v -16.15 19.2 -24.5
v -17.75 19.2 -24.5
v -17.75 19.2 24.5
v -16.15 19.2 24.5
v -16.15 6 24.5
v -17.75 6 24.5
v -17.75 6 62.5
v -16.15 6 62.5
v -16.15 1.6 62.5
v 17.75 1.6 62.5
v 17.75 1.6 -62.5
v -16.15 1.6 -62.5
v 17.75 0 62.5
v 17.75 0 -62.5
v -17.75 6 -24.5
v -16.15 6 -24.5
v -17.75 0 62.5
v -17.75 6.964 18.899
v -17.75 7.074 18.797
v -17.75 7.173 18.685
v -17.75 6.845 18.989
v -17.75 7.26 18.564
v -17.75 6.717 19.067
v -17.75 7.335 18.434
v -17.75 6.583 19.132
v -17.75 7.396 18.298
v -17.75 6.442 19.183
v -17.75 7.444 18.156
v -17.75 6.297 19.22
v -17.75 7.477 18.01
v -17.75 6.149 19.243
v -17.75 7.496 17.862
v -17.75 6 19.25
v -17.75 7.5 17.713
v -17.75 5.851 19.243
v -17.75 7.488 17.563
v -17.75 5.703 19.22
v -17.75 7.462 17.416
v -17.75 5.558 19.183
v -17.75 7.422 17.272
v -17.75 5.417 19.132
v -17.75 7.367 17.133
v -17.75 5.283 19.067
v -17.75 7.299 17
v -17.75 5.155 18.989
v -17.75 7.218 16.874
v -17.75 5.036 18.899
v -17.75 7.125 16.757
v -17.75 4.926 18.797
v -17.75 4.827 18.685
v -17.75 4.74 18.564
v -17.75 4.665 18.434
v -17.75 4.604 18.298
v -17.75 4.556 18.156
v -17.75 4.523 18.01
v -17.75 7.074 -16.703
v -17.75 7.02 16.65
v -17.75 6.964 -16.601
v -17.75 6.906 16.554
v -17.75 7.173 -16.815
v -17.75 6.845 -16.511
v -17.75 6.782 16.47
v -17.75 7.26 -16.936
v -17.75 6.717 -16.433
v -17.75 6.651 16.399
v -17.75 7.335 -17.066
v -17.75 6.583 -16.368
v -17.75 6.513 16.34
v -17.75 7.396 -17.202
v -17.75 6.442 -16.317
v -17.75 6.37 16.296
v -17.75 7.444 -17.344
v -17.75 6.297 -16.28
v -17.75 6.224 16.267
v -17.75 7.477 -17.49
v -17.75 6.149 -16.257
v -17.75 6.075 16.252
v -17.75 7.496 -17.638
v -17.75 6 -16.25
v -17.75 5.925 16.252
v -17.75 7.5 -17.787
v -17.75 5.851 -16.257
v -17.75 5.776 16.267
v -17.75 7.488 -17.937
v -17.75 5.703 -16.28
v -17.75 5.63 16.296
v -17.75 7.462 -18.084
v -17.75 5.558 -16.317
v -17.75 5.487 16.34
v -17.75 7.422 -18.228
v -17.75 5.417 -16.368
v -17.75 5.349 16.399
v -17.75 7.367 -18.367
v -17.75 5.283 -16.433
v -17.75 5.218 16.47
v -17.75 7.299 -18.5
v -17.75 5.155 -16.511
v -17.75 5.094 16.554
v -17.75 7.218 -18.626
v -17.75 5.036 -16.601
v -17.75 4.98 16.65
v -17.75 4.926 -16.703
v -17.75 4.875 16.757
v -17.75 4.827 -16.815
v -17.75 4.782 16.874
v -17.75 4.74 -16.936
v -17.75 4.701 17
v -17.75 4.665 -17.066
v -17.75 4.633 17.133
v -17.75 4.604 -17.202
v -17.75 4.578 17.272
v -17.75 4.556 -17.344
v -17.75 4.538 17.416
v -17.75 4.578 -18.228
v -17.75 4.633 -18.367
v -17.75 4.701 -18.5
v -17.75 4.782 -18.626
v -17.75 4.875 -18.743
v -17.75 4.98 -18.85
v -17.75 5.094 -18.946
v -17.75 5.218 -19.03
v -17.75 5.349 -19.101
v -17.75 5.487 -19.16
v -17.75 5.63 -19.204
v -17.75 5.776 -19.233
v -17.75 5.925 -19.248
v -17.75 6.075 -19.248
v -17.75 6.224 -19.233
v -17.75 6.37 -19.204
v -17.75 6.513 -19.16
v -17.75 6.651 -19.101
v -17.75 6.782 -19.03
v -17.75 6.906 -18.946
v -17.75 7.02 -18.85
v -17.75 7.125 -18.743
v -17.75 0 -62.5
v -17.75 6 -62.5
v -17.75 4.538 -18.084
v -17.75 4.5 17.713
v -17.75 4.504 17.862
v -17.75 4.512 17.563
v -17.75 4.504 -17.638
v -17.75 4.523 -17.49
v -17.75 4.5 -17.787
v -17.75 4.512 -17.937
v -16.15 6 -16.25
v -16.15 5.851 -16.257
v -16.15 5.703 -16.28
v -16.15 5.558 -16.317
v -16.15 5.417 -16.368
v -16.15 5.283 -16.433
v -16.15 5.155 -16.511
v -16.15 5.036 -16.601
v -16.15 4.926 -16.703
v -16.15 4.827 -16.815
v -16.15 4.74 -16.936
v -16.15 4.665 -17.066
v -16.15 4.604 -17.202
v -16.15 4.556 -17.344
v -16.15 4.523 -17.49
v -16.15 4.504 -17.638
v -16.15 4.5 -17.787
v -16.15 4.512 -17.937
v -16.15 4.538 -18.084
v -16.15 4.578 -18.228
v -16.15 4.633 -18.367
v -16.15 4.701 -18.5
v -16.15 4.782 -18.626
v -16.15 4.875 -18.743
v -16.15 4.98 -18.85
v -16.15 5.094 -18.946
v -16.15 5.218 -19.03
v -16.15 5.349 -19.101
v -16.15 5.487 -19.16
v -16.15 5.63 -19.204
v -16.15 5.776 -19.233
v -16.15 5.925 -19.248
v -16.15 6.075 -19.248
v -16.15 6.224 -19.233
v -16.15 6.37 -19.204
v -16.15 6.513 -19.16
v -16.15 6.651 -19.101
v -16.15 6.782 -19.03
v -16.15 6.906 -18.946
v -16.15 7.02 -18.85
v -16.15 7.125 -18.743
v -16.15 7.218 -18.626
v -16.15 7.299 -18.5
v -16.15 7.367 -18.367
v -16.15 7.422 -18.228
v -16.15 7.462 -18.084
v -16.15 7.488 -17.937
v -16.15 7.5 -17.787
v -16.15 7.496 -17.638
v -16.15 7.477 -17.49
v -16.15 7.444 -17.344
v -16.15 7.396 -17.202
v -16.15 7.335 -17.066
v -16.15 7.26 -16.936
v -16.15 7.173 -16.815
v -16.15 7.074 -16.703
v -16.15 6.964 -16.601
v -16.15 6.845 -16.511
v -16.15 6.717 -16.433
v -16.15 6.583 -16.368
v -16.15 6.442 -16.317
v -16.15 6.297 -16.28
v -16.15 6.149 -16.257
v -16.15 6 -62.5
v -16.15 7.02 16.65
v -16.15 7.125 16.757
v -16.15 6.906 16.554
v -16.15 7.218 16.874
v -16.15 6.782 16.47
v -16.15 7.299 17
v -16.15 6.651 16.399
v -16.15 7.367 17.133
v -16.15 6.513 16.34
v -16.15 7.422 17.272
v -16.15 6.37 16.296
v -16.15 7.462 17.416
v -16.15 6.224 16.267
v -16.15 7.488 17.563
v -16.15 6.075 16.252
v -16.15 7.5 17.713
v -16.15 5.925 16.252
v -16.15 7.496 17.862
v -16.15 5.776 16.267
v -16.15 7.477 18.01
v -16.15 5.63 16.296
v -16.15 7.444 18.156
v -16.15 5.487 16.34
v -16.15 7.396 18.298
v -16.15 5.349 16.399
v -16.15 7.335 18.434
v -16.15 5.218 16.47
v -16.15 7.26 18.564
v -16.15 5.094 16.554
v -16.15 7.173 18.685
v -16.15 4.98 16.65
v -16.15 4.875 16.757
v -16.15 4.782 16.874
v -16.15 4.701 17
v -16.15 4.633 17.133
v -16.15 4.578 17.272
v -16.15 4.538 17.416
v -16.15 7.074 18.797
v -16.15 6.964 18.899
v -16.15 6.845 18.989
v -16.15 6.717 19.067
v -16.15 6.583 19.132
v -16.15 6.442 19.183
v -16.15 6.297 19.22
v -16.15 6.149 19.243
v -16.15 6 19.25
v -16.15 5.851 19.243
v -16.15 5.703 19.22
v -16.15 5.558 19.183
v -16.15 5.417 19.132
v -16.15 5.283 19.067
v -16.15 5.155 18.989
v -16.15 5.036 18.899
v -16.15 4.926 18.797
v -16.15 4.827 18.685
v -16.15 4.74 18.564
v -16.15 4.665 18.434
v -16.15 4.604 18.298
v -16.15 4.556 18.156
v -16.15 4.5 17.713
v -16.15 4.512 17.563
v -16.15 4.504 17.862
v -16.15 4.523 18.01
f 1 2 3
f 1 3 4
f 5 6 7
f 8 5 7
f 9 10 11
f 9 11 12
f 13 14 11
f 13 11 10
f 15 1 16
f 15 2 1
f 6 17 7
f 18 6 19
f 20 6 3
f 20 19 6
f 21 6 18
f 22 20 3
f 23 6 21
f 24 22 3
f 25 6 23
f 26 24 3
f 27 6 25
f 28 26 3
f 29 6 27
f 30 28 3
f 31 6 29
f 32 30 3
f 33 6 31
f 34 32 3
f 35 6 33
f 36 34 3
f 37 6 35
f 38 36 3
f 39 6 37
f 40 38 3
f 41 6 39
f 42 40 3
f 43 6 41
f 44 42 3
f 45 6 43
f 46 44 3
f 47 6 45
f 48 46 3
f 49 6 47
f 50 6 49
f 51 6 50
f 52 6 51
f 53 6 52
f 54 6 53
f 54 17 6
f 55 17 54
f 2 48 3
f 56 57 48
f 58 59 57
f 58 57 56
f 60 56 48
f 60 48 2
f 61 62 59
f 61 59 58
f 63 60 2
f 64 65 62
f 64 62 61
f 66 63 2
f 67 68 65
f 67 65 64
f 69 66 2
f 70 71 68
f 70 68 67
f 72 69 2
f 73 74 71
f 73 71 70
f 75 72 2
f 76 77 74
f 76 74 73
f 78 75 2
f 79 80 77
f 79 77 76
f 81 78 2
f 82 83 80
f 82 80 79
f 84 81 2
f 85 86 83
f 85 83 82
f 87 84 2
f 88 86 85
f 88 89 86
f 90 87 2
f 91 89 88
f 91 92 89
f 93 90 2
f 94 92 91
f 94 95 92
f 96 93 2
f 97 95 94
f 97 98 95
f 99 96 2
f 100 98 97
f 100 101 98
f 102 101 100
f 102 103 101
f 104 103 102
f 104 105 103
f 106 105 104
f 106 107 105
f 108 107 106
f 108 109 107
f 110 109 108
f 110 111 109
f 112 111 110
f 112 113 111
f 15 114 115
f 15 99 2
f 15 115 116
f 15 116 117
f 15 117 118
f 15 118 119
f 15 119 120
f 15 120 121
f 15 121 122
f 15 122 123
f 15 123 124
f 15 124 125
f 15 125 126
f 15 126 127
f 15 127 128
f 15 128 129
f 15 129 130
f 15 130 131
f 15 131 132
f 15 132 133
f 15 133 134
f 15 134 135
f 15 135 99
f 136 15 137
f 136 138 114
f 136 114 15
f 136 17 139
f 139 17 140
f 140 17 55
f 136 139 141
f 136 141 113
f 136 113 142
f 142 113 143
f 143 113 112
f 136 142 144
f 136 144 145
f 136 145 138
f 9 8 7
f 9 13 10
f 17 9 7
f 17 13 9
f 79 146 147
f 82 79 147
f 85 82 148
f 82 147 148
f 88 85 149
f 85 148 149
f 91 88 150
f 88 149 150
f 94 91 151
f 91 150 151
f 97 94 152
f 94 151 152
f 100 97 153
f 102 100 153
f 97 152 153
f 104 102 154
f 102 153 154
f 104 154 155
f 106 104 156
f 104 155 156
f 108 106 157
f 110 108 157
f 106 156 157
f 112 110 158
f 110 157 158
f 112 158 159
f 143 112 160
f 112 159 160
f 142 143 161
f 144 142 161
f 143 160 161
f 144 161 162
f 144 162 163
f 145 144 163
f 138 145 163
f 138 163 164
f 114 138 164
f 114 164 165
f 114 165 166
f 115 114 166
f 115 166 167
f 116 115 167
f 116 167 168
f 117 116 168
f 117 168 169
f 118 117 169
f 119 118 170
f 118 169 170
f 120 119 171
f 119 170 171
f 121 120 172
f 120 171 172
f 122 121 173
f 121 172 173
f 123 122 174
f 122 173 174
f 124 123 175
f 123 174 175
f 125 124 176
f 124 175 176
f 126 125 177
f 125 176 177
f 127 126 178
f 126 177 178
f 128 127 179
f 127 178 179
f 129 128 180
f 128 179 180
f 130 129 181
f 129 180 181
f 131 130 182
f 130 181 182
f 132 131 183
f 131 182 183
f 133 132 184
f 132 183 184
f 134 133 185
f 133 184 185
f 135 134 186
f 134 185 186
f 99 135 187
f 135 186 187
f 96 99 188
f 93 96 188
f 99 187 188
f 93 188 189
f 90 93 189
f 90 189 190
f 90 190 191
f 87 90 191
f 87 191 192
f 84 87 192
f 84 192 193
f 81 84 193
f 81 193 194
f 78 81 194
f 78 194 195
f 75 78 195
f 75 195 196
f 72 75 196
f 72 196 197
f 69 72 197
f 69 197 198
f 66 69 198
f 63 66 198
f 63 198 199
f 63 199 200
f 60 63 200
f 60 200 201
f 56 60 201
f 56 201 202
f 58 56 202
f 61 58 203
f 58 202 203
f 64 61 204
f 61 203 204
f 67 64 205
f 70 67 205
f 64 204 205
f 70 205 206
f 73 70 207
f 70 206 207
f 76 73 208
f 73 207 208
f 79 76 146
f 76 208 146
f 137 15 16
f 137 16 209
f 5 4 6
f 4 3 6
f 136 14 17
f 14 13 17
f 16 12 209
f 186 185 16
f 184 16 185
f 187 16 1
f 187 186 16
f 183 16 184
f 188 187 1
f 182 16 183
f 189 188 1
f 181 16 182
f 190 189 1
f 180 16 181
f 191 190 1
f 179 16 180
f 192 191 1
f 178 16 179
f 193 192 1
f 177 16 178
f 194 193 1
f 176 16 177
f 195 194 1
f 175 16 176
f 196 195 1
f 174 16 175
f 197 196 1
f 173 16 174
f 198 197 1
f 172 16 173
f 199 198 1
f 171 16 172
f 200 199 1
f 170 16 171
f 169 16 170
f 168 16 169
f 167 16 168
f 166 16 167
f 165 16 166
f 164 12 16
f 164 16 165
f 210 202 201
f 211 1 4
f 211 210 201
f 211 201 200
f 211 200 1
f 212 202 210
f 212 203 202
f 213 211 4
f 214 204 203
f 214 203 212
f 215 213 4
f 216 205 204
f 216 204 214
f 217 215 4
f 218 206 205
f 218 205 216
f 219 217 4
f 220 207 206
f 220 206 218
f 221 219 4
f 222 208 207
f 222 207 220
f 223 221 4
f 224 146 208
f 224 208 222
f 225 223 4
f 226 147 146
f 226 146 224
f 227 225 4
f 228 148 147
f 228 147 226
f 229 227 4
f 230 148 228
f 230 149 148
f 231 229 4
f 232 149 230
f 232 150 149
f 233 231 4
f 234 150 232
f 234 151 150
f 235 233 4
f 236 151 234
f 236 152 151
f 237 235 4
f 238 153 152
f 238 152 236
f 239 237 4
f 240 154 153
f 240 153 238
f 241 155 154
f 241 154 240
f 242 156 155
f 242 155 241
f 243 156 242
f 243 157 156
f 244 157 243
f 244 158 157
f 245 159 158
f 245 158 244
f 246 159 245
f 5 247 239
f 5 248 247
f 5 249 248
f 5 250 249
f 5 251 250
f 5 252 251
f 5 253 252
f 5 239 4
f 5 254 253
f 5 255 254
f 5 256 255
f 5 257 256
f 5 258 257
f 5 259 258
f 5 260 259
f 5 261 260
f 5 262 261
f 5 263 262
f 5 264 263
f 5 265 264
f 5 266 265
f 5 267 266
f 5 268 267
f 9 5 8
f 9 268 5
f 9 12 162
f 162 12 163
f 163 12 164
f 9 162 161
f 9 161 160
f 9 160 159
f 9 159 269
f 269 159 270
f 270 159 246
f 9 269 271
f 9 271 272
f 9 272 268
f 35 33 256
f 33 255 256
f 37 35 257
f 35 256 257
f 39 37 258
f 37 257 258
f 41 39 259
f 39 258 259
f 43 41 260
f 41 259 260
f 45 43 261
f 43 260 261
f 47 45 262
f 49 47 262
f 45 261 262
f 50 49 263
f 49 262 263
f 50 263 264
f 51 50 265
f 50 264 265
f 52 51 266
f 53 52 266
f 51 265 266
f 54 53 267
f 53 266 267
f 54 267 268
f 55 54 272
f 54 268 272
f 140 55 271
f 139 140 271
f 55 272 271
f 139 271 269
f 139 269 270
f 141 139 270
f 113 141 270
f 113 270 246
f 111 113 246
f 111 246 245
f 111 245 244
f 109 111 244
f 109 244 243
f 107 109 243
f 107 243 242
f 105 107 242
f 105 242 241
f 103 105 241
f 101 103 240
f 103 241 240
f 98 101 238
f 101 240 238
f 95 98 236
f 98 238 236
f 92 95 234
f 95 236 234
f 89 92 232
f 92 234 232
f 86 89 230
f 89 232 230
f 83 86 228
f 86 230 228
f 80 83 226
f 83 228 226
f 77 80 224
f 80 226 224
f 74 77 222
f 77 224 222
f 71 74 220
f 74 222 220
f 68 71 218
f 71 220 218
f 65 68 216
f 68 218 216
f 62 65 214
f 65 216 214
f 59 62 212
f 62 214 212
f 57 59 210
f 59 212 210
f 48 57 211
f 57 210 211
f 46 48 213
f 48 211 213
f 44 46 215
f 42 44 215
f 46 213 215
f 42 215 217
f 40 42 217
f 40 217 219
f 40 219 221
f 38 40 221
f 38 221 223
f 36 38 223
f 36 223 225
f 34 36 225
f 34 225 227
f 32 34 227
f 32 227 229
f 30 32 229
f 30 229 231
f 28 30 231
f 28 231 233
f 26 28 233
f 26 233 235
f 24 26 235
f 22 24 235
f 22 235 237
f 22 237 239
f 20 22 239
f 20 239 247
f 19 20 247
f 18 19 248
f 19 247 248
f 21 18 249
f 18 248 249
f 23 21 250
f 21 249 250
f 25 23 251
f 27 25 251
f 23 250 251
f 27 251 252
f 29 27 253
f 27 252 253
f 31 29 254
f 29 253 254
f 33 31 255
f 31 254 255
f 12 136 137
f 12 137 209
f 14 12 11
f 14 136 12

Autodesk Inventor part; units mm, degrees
ref_plane "YZ Plane" through (0, 0, 0) normal (1, 0, 0) x (0, 1, 0)
ref_plane "XZ Plane" through (0, 0, 0) normal (0, 1, 0) x (-1, 0, 0)
ref_plane "XY Plane" through (0, 0, 0) normal (0, 0, 1) x (1, 0, 0)
sketch "Sketch1" plane through (0, 0, 0) normal (0, 1, 0) x (-1, 0, 0)
  line L0 (-17.75, 62.5) -> (17.75, 62.5)
  line L1 (17.75, 62.5) -> (17.75, -62.5)
  line L2 (17.75, -62.5) -> (-17.75, -62.5)
  line L3 (-17.75, -62.5) -> (-17.75, 62.5)
  line L4 (-17.75, 62.5) -> (17.75, -62.5) construction
  line L5 (17.75, 62.5) -> (-17.75, -62.5) construction
  point P0 (0, 0)
  dimension "d0" = 35.5
  dimension "d1" = 125
extrude "Extrusion1" add sketch "Sketch1" along normal blind 1.6
sketch "Sketch2" plane through (0, 1.6, 0) normal (0, 1, 0) x (1, 0, 0)
  line L0 (17.75, 62.5) -> (-17.75, 62.5) projected
  line L1 (-17.75, -62.5) -> (17.75, -62.5) projected
  line L2 (-17.75, 62.5) -> (-16.15, 62.5)
  line L3 (-16.15, 62.5) -> (-16.15, -62.5)
  line L4 (-16.15, -62.5) -> (-17.75, -62.5)
  line L5 (-17.75, -62.5) -> (-17.75, 62.5)
  point P0 (0, 0)
  dimension "d4" = 1.6
extrude "Extrusion2" add sketch "Sketch2" along normal blind 17.6
sketch "Sketch3" plane through (-17.75, 0, -62.5) normal (-1, 0, 0) x (0, 0, 1)
  line L0 (62.5, 0) -> (62.5, 72.1121) construction
  line L1 (98.5, 0) -> (26.5, 0) construction
  line L2 (26.5, 0) -> (26.5, 19.2) construction
  line L3 (26.5, 19.2) -> (98.5, 19.2) construction
  line L4 (98.5, 19.2) -> (98.5, 0) construction
  line L5 (98.5, 0) -> (26.5, 19.2) construction
  line L6 (26.5, 0) -> (98.5, 19.2) construction
  line L7 (0, 19.2) -> (125, 19.2) construction
  line L8 (125, 0) -> (0, 0) construction
  line L9 (125, 19.2) -> (87, 19.2)
  line L10 (87, 19.2) -> (87, 6)
  line L11 (87, 6) -> (125, 6)
  line L12 (125, 6) -> (125, 19.2)
  line L13 (0, 19.2) -> (38, 19.2)
  line L14 (38, 19.2) -> (38, 6)
  line L15 (38, 6) -> (0, 6)
  line L16 (0, 6) -> (0, 19.2)
  point P0 (62.5, 9.6)
  dimension "d7" = 72
  dimension "d8" = 38
  dimension "d9" = 6
extrude "Extrusion3" cut sketch "Sketch3" against normal through all
sketch "Sketch4" plane through (-17.75, 0, -62.5) normal (-1, 0, 0) x (0, 0, 1)
  line L0 (62.5, 0) -> (62.5, 59.5527) construction
  line L1 (44.75, 6) -> (80.25, 6) construction
  line L2 (80.25, 6) -> (80.25, 0) construction
  line L3 (80.25, 0) -> (44.75, 0) construction
  line L4 (44.75, 0) -> (44.75, 6) construction
  line L5 (44.75, 6) -> (80.25, 0) construction
  line L6 (80.25, 6) -> (44.75, 0) construction
  line L7 (125, 0) -> (0, 0) construction
  point P0 (62.5, 3)
  dimension "d12" = 6
  dimension "d13" = 35.5
hole "Hole1" at (-17.75, 6, 17.75) at (-17.75, 6, -17.75) direction (1, 0, 0) diameter 3 end through all
properties part number "fitplate"
